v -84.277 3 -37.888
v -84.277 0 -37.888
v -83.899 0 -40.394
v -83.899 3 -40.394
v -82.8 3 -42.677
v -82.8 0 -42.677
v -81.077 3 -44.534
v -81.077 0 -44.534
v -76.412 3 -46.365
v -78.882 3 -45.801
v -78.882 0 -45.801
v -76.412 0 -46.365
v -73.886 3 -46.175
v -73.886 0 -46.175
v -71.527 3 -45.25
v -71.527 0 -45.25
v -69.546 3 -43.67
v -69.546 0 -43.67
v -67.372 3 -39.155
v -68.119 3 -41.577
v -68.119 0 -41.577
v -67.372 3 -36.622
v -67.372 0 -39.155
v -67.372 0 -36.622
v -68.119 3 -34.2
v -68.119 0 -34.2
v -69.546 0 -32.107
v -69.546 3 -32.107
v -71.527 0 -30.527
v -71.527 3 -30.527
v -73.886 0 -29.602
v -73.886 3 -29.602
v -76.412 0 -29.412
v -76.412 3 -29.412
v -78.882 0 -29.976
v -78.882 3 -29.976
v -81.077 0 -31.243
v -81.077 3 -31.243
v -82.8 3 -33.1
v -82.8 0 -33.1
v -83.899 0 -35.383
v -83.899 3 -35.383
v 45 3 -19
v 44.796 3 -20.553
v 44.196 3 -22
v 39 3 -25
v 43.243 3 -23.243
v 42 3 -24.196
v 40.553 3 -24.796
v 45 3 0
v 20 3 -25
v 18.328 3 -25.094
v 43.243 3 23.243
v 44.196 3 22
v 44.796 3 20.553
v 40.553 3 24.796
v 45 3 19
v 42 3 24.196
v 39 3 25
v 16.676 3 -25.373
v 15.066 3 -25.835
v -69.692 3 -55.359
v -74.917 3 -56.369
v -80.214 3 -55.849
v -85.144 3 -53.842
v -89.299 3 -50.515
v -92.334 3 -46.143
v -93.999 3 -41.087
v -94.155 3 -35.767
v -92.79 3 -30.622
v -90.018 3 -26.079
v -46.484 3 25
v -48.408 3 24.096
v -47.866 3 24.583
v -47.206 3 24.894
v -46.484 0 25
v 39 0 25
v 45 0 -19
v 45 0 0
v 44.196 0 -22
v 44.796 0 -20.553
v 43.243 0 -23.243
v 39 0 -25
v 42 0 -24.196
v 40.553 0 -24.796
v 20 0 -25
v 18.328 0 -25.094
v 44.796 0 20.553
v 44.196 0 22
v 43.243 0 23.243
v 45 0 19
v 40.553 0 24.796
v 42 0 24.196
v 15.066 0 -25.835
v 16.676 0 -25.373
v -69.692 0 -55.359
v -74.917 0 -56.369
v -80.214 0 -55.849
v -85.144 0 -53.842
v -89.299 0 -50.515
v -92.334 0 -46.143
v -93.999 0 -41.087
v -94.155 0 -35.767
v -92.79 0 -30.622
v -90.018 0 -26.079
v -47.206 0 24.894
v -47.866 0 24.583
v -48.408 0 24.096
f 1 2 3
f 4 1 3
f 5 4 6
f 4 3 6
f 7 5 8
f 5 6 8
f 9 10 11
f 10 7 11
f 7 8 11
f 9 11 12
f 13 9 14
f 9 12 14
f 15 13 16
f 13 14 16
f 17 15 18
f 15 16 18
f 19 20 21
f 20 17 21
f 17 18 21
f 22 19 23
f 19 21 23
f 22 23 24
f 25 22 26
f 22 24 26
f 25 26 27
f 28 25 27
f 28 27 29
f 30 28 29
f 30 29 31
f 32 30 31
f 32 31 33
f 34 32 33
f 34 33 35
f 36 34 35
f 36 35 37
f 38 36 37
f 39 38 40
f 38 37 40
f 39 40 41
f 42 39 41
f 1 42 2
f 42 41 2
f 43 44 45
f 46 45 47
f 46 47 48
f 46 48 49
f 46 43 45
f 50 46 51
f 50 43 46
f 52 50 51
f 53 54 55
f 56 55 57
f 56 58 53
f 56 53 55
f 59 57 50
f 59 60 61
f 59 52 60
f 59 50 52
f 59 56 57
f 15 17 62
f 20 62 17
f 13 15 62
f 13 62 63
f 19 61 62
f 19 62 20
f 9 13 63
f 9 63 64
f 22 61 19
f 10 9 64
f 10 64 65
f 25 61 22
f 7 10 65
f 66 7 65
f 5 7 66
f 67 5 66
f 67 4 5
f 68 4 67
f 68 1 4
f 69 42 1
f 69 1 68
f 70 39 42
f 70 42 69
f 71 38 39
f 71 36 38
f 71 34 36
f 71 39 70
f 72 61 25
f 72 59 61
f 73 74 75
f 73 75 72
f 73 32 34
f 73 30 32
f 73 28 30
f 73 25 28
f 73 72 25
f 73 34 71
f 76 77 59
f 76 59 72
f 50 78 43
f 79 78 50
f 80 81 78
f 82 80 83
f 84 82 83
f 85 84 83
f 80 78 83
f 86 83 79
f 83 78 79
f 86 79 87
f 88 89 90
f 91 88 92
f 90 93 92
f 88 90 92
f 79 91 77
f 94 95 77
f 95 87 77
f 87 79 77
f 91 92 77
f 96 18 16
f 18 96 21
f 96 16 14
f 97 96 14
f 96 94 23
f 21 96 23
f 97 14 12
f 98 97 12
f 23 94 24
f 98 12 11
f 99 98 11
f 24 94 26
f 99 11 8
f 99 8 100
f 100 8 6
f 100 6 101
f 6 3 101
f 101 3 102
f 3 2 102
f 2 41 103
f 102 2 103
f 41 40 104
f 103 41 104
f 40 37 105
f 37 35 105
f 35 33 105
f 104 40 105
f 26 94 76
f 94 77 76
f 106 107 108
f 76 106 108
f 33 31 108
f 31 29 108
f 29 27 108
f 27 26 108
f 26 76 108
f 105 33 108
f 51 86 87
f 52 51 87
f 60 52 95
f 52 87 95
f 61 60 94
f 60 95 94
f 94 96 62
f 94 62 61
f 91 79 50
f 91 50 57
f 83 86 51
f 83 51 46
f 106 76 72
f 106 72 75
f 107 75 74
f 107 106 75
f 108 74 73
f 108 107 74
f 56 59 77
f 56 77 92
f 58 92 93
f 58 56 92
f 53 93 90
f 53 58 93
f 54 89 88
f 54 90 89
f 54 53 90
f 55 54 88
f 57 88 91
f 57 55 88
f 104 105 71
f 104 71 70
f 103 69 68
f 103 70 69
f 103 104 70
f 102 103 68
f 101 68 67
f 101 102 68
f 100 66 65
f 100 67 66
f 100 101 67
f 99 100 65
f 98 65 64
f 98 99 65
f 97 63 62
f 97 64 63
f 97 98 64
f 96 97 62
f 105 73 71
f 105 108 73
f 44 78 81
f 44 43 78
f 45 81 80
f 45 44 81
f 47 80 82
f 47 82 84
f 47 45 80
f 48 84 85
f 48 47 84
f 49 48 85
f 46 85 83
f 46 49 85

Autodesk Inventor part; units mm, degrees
ref_plane "YZ Plane" through (0, 0, 0) normal (1, 0, 0) x (0, 1, 0)
ref_plane "XZ Plane" through (0, 0, 0) normal (0, 1, 0) x (-1, 0, 0)
ref_plane "XY Plane" through (0, 0, 0) normal (0, 0, 1) x (1, 0, 0)
sketch "Sketch1" plane through (0, 0, 0) normal (0, 1, 0) x (-1, 0, 0)
  line L0 (40, 20) -> (-40, 20) construction
  line L1 (-40, 20) -> (-40, -20) construction
  line L2 (-40, -20) -> (40, -20) construction
  line L3 (40, -20) -> (40, 20) construction
  line L4 (-40, 20) -> (40, -20) construction
  line L5 (0, 20) -> (0, -20) construction
  line L6 (-45, -25) -> (-45, 0)
  line L7 (-20, -25) -> (-45, -25)
  arc A0 (69.6915, -55.359) -> (90.0175, -26.0792) centre (75.7771, -37.8885) ccw
  circle A1 centre (75.7771, -37.8885) radius 8.5
  line L8 (69.6915, -55.359) -> (-15.0657, -25.8348)
  arc A2 (-15.0657, -25.8348) -> (-20, -25) centre (-20, -40) ccw
  arc A3 (90.0175, -26.0792) -> (69.6915, -55.359) centre (75.7771, -37.8885) ccw construction
  line L9 (-45, 0) -> (-45, 25)
  line L10 (-45, 25) -> (46.484, 25)
  line L11 (40, 0) -> (45, 0) construction
  line L12 (0, 20) -> (0, 25) construction
  line L13 (-40, 0) -> (-45, 0) construction
  line L14 (47.6585, 25) -> (48.4083, 24.0959) construction
  arc A4 (48.4083, 24.0959) -> (46.484, 25) centre (46.484, 22.5) ccw
  arc A5 (46.484, 25) -> (48.4083, 24.0959) centre (46.484, 22.5) ccw construction
  line L15 (48.4083, 24.0959) -> (90.0175, -26.0792)
  line L16 (46.484, 25) -> (47.6585, 25) construction
  point P0 (0, 0)
  point P1 (0, 0)
  point P2 (0, 0)
  dimension "d2" = 80
  dimension "d3" = 40
  dimension "d29" = 5
  dimension "d30" = 17
  dimension "d31" = 10
  dimension "d32" = 40
  dimension "d34" = 5
  dimension "d35" = 15
  dimension "d36" = 25
  dimension "d38" = 5
  dimension "d41" = 66.3579
extrude "Plate1" add sketch "Sketch1" along normal blind 3
fillet "Corner Round3" radius 6 2 edges at (45, 1.5, 25) (45, 1.5, -25)
equation "\"d34\" = d29"
equation "\"d6\" = Thickness"
equation "\"Thickness\" = 3"
properties part number "NDM-VOS Пятка под стойки" material "Stainless Steel"
